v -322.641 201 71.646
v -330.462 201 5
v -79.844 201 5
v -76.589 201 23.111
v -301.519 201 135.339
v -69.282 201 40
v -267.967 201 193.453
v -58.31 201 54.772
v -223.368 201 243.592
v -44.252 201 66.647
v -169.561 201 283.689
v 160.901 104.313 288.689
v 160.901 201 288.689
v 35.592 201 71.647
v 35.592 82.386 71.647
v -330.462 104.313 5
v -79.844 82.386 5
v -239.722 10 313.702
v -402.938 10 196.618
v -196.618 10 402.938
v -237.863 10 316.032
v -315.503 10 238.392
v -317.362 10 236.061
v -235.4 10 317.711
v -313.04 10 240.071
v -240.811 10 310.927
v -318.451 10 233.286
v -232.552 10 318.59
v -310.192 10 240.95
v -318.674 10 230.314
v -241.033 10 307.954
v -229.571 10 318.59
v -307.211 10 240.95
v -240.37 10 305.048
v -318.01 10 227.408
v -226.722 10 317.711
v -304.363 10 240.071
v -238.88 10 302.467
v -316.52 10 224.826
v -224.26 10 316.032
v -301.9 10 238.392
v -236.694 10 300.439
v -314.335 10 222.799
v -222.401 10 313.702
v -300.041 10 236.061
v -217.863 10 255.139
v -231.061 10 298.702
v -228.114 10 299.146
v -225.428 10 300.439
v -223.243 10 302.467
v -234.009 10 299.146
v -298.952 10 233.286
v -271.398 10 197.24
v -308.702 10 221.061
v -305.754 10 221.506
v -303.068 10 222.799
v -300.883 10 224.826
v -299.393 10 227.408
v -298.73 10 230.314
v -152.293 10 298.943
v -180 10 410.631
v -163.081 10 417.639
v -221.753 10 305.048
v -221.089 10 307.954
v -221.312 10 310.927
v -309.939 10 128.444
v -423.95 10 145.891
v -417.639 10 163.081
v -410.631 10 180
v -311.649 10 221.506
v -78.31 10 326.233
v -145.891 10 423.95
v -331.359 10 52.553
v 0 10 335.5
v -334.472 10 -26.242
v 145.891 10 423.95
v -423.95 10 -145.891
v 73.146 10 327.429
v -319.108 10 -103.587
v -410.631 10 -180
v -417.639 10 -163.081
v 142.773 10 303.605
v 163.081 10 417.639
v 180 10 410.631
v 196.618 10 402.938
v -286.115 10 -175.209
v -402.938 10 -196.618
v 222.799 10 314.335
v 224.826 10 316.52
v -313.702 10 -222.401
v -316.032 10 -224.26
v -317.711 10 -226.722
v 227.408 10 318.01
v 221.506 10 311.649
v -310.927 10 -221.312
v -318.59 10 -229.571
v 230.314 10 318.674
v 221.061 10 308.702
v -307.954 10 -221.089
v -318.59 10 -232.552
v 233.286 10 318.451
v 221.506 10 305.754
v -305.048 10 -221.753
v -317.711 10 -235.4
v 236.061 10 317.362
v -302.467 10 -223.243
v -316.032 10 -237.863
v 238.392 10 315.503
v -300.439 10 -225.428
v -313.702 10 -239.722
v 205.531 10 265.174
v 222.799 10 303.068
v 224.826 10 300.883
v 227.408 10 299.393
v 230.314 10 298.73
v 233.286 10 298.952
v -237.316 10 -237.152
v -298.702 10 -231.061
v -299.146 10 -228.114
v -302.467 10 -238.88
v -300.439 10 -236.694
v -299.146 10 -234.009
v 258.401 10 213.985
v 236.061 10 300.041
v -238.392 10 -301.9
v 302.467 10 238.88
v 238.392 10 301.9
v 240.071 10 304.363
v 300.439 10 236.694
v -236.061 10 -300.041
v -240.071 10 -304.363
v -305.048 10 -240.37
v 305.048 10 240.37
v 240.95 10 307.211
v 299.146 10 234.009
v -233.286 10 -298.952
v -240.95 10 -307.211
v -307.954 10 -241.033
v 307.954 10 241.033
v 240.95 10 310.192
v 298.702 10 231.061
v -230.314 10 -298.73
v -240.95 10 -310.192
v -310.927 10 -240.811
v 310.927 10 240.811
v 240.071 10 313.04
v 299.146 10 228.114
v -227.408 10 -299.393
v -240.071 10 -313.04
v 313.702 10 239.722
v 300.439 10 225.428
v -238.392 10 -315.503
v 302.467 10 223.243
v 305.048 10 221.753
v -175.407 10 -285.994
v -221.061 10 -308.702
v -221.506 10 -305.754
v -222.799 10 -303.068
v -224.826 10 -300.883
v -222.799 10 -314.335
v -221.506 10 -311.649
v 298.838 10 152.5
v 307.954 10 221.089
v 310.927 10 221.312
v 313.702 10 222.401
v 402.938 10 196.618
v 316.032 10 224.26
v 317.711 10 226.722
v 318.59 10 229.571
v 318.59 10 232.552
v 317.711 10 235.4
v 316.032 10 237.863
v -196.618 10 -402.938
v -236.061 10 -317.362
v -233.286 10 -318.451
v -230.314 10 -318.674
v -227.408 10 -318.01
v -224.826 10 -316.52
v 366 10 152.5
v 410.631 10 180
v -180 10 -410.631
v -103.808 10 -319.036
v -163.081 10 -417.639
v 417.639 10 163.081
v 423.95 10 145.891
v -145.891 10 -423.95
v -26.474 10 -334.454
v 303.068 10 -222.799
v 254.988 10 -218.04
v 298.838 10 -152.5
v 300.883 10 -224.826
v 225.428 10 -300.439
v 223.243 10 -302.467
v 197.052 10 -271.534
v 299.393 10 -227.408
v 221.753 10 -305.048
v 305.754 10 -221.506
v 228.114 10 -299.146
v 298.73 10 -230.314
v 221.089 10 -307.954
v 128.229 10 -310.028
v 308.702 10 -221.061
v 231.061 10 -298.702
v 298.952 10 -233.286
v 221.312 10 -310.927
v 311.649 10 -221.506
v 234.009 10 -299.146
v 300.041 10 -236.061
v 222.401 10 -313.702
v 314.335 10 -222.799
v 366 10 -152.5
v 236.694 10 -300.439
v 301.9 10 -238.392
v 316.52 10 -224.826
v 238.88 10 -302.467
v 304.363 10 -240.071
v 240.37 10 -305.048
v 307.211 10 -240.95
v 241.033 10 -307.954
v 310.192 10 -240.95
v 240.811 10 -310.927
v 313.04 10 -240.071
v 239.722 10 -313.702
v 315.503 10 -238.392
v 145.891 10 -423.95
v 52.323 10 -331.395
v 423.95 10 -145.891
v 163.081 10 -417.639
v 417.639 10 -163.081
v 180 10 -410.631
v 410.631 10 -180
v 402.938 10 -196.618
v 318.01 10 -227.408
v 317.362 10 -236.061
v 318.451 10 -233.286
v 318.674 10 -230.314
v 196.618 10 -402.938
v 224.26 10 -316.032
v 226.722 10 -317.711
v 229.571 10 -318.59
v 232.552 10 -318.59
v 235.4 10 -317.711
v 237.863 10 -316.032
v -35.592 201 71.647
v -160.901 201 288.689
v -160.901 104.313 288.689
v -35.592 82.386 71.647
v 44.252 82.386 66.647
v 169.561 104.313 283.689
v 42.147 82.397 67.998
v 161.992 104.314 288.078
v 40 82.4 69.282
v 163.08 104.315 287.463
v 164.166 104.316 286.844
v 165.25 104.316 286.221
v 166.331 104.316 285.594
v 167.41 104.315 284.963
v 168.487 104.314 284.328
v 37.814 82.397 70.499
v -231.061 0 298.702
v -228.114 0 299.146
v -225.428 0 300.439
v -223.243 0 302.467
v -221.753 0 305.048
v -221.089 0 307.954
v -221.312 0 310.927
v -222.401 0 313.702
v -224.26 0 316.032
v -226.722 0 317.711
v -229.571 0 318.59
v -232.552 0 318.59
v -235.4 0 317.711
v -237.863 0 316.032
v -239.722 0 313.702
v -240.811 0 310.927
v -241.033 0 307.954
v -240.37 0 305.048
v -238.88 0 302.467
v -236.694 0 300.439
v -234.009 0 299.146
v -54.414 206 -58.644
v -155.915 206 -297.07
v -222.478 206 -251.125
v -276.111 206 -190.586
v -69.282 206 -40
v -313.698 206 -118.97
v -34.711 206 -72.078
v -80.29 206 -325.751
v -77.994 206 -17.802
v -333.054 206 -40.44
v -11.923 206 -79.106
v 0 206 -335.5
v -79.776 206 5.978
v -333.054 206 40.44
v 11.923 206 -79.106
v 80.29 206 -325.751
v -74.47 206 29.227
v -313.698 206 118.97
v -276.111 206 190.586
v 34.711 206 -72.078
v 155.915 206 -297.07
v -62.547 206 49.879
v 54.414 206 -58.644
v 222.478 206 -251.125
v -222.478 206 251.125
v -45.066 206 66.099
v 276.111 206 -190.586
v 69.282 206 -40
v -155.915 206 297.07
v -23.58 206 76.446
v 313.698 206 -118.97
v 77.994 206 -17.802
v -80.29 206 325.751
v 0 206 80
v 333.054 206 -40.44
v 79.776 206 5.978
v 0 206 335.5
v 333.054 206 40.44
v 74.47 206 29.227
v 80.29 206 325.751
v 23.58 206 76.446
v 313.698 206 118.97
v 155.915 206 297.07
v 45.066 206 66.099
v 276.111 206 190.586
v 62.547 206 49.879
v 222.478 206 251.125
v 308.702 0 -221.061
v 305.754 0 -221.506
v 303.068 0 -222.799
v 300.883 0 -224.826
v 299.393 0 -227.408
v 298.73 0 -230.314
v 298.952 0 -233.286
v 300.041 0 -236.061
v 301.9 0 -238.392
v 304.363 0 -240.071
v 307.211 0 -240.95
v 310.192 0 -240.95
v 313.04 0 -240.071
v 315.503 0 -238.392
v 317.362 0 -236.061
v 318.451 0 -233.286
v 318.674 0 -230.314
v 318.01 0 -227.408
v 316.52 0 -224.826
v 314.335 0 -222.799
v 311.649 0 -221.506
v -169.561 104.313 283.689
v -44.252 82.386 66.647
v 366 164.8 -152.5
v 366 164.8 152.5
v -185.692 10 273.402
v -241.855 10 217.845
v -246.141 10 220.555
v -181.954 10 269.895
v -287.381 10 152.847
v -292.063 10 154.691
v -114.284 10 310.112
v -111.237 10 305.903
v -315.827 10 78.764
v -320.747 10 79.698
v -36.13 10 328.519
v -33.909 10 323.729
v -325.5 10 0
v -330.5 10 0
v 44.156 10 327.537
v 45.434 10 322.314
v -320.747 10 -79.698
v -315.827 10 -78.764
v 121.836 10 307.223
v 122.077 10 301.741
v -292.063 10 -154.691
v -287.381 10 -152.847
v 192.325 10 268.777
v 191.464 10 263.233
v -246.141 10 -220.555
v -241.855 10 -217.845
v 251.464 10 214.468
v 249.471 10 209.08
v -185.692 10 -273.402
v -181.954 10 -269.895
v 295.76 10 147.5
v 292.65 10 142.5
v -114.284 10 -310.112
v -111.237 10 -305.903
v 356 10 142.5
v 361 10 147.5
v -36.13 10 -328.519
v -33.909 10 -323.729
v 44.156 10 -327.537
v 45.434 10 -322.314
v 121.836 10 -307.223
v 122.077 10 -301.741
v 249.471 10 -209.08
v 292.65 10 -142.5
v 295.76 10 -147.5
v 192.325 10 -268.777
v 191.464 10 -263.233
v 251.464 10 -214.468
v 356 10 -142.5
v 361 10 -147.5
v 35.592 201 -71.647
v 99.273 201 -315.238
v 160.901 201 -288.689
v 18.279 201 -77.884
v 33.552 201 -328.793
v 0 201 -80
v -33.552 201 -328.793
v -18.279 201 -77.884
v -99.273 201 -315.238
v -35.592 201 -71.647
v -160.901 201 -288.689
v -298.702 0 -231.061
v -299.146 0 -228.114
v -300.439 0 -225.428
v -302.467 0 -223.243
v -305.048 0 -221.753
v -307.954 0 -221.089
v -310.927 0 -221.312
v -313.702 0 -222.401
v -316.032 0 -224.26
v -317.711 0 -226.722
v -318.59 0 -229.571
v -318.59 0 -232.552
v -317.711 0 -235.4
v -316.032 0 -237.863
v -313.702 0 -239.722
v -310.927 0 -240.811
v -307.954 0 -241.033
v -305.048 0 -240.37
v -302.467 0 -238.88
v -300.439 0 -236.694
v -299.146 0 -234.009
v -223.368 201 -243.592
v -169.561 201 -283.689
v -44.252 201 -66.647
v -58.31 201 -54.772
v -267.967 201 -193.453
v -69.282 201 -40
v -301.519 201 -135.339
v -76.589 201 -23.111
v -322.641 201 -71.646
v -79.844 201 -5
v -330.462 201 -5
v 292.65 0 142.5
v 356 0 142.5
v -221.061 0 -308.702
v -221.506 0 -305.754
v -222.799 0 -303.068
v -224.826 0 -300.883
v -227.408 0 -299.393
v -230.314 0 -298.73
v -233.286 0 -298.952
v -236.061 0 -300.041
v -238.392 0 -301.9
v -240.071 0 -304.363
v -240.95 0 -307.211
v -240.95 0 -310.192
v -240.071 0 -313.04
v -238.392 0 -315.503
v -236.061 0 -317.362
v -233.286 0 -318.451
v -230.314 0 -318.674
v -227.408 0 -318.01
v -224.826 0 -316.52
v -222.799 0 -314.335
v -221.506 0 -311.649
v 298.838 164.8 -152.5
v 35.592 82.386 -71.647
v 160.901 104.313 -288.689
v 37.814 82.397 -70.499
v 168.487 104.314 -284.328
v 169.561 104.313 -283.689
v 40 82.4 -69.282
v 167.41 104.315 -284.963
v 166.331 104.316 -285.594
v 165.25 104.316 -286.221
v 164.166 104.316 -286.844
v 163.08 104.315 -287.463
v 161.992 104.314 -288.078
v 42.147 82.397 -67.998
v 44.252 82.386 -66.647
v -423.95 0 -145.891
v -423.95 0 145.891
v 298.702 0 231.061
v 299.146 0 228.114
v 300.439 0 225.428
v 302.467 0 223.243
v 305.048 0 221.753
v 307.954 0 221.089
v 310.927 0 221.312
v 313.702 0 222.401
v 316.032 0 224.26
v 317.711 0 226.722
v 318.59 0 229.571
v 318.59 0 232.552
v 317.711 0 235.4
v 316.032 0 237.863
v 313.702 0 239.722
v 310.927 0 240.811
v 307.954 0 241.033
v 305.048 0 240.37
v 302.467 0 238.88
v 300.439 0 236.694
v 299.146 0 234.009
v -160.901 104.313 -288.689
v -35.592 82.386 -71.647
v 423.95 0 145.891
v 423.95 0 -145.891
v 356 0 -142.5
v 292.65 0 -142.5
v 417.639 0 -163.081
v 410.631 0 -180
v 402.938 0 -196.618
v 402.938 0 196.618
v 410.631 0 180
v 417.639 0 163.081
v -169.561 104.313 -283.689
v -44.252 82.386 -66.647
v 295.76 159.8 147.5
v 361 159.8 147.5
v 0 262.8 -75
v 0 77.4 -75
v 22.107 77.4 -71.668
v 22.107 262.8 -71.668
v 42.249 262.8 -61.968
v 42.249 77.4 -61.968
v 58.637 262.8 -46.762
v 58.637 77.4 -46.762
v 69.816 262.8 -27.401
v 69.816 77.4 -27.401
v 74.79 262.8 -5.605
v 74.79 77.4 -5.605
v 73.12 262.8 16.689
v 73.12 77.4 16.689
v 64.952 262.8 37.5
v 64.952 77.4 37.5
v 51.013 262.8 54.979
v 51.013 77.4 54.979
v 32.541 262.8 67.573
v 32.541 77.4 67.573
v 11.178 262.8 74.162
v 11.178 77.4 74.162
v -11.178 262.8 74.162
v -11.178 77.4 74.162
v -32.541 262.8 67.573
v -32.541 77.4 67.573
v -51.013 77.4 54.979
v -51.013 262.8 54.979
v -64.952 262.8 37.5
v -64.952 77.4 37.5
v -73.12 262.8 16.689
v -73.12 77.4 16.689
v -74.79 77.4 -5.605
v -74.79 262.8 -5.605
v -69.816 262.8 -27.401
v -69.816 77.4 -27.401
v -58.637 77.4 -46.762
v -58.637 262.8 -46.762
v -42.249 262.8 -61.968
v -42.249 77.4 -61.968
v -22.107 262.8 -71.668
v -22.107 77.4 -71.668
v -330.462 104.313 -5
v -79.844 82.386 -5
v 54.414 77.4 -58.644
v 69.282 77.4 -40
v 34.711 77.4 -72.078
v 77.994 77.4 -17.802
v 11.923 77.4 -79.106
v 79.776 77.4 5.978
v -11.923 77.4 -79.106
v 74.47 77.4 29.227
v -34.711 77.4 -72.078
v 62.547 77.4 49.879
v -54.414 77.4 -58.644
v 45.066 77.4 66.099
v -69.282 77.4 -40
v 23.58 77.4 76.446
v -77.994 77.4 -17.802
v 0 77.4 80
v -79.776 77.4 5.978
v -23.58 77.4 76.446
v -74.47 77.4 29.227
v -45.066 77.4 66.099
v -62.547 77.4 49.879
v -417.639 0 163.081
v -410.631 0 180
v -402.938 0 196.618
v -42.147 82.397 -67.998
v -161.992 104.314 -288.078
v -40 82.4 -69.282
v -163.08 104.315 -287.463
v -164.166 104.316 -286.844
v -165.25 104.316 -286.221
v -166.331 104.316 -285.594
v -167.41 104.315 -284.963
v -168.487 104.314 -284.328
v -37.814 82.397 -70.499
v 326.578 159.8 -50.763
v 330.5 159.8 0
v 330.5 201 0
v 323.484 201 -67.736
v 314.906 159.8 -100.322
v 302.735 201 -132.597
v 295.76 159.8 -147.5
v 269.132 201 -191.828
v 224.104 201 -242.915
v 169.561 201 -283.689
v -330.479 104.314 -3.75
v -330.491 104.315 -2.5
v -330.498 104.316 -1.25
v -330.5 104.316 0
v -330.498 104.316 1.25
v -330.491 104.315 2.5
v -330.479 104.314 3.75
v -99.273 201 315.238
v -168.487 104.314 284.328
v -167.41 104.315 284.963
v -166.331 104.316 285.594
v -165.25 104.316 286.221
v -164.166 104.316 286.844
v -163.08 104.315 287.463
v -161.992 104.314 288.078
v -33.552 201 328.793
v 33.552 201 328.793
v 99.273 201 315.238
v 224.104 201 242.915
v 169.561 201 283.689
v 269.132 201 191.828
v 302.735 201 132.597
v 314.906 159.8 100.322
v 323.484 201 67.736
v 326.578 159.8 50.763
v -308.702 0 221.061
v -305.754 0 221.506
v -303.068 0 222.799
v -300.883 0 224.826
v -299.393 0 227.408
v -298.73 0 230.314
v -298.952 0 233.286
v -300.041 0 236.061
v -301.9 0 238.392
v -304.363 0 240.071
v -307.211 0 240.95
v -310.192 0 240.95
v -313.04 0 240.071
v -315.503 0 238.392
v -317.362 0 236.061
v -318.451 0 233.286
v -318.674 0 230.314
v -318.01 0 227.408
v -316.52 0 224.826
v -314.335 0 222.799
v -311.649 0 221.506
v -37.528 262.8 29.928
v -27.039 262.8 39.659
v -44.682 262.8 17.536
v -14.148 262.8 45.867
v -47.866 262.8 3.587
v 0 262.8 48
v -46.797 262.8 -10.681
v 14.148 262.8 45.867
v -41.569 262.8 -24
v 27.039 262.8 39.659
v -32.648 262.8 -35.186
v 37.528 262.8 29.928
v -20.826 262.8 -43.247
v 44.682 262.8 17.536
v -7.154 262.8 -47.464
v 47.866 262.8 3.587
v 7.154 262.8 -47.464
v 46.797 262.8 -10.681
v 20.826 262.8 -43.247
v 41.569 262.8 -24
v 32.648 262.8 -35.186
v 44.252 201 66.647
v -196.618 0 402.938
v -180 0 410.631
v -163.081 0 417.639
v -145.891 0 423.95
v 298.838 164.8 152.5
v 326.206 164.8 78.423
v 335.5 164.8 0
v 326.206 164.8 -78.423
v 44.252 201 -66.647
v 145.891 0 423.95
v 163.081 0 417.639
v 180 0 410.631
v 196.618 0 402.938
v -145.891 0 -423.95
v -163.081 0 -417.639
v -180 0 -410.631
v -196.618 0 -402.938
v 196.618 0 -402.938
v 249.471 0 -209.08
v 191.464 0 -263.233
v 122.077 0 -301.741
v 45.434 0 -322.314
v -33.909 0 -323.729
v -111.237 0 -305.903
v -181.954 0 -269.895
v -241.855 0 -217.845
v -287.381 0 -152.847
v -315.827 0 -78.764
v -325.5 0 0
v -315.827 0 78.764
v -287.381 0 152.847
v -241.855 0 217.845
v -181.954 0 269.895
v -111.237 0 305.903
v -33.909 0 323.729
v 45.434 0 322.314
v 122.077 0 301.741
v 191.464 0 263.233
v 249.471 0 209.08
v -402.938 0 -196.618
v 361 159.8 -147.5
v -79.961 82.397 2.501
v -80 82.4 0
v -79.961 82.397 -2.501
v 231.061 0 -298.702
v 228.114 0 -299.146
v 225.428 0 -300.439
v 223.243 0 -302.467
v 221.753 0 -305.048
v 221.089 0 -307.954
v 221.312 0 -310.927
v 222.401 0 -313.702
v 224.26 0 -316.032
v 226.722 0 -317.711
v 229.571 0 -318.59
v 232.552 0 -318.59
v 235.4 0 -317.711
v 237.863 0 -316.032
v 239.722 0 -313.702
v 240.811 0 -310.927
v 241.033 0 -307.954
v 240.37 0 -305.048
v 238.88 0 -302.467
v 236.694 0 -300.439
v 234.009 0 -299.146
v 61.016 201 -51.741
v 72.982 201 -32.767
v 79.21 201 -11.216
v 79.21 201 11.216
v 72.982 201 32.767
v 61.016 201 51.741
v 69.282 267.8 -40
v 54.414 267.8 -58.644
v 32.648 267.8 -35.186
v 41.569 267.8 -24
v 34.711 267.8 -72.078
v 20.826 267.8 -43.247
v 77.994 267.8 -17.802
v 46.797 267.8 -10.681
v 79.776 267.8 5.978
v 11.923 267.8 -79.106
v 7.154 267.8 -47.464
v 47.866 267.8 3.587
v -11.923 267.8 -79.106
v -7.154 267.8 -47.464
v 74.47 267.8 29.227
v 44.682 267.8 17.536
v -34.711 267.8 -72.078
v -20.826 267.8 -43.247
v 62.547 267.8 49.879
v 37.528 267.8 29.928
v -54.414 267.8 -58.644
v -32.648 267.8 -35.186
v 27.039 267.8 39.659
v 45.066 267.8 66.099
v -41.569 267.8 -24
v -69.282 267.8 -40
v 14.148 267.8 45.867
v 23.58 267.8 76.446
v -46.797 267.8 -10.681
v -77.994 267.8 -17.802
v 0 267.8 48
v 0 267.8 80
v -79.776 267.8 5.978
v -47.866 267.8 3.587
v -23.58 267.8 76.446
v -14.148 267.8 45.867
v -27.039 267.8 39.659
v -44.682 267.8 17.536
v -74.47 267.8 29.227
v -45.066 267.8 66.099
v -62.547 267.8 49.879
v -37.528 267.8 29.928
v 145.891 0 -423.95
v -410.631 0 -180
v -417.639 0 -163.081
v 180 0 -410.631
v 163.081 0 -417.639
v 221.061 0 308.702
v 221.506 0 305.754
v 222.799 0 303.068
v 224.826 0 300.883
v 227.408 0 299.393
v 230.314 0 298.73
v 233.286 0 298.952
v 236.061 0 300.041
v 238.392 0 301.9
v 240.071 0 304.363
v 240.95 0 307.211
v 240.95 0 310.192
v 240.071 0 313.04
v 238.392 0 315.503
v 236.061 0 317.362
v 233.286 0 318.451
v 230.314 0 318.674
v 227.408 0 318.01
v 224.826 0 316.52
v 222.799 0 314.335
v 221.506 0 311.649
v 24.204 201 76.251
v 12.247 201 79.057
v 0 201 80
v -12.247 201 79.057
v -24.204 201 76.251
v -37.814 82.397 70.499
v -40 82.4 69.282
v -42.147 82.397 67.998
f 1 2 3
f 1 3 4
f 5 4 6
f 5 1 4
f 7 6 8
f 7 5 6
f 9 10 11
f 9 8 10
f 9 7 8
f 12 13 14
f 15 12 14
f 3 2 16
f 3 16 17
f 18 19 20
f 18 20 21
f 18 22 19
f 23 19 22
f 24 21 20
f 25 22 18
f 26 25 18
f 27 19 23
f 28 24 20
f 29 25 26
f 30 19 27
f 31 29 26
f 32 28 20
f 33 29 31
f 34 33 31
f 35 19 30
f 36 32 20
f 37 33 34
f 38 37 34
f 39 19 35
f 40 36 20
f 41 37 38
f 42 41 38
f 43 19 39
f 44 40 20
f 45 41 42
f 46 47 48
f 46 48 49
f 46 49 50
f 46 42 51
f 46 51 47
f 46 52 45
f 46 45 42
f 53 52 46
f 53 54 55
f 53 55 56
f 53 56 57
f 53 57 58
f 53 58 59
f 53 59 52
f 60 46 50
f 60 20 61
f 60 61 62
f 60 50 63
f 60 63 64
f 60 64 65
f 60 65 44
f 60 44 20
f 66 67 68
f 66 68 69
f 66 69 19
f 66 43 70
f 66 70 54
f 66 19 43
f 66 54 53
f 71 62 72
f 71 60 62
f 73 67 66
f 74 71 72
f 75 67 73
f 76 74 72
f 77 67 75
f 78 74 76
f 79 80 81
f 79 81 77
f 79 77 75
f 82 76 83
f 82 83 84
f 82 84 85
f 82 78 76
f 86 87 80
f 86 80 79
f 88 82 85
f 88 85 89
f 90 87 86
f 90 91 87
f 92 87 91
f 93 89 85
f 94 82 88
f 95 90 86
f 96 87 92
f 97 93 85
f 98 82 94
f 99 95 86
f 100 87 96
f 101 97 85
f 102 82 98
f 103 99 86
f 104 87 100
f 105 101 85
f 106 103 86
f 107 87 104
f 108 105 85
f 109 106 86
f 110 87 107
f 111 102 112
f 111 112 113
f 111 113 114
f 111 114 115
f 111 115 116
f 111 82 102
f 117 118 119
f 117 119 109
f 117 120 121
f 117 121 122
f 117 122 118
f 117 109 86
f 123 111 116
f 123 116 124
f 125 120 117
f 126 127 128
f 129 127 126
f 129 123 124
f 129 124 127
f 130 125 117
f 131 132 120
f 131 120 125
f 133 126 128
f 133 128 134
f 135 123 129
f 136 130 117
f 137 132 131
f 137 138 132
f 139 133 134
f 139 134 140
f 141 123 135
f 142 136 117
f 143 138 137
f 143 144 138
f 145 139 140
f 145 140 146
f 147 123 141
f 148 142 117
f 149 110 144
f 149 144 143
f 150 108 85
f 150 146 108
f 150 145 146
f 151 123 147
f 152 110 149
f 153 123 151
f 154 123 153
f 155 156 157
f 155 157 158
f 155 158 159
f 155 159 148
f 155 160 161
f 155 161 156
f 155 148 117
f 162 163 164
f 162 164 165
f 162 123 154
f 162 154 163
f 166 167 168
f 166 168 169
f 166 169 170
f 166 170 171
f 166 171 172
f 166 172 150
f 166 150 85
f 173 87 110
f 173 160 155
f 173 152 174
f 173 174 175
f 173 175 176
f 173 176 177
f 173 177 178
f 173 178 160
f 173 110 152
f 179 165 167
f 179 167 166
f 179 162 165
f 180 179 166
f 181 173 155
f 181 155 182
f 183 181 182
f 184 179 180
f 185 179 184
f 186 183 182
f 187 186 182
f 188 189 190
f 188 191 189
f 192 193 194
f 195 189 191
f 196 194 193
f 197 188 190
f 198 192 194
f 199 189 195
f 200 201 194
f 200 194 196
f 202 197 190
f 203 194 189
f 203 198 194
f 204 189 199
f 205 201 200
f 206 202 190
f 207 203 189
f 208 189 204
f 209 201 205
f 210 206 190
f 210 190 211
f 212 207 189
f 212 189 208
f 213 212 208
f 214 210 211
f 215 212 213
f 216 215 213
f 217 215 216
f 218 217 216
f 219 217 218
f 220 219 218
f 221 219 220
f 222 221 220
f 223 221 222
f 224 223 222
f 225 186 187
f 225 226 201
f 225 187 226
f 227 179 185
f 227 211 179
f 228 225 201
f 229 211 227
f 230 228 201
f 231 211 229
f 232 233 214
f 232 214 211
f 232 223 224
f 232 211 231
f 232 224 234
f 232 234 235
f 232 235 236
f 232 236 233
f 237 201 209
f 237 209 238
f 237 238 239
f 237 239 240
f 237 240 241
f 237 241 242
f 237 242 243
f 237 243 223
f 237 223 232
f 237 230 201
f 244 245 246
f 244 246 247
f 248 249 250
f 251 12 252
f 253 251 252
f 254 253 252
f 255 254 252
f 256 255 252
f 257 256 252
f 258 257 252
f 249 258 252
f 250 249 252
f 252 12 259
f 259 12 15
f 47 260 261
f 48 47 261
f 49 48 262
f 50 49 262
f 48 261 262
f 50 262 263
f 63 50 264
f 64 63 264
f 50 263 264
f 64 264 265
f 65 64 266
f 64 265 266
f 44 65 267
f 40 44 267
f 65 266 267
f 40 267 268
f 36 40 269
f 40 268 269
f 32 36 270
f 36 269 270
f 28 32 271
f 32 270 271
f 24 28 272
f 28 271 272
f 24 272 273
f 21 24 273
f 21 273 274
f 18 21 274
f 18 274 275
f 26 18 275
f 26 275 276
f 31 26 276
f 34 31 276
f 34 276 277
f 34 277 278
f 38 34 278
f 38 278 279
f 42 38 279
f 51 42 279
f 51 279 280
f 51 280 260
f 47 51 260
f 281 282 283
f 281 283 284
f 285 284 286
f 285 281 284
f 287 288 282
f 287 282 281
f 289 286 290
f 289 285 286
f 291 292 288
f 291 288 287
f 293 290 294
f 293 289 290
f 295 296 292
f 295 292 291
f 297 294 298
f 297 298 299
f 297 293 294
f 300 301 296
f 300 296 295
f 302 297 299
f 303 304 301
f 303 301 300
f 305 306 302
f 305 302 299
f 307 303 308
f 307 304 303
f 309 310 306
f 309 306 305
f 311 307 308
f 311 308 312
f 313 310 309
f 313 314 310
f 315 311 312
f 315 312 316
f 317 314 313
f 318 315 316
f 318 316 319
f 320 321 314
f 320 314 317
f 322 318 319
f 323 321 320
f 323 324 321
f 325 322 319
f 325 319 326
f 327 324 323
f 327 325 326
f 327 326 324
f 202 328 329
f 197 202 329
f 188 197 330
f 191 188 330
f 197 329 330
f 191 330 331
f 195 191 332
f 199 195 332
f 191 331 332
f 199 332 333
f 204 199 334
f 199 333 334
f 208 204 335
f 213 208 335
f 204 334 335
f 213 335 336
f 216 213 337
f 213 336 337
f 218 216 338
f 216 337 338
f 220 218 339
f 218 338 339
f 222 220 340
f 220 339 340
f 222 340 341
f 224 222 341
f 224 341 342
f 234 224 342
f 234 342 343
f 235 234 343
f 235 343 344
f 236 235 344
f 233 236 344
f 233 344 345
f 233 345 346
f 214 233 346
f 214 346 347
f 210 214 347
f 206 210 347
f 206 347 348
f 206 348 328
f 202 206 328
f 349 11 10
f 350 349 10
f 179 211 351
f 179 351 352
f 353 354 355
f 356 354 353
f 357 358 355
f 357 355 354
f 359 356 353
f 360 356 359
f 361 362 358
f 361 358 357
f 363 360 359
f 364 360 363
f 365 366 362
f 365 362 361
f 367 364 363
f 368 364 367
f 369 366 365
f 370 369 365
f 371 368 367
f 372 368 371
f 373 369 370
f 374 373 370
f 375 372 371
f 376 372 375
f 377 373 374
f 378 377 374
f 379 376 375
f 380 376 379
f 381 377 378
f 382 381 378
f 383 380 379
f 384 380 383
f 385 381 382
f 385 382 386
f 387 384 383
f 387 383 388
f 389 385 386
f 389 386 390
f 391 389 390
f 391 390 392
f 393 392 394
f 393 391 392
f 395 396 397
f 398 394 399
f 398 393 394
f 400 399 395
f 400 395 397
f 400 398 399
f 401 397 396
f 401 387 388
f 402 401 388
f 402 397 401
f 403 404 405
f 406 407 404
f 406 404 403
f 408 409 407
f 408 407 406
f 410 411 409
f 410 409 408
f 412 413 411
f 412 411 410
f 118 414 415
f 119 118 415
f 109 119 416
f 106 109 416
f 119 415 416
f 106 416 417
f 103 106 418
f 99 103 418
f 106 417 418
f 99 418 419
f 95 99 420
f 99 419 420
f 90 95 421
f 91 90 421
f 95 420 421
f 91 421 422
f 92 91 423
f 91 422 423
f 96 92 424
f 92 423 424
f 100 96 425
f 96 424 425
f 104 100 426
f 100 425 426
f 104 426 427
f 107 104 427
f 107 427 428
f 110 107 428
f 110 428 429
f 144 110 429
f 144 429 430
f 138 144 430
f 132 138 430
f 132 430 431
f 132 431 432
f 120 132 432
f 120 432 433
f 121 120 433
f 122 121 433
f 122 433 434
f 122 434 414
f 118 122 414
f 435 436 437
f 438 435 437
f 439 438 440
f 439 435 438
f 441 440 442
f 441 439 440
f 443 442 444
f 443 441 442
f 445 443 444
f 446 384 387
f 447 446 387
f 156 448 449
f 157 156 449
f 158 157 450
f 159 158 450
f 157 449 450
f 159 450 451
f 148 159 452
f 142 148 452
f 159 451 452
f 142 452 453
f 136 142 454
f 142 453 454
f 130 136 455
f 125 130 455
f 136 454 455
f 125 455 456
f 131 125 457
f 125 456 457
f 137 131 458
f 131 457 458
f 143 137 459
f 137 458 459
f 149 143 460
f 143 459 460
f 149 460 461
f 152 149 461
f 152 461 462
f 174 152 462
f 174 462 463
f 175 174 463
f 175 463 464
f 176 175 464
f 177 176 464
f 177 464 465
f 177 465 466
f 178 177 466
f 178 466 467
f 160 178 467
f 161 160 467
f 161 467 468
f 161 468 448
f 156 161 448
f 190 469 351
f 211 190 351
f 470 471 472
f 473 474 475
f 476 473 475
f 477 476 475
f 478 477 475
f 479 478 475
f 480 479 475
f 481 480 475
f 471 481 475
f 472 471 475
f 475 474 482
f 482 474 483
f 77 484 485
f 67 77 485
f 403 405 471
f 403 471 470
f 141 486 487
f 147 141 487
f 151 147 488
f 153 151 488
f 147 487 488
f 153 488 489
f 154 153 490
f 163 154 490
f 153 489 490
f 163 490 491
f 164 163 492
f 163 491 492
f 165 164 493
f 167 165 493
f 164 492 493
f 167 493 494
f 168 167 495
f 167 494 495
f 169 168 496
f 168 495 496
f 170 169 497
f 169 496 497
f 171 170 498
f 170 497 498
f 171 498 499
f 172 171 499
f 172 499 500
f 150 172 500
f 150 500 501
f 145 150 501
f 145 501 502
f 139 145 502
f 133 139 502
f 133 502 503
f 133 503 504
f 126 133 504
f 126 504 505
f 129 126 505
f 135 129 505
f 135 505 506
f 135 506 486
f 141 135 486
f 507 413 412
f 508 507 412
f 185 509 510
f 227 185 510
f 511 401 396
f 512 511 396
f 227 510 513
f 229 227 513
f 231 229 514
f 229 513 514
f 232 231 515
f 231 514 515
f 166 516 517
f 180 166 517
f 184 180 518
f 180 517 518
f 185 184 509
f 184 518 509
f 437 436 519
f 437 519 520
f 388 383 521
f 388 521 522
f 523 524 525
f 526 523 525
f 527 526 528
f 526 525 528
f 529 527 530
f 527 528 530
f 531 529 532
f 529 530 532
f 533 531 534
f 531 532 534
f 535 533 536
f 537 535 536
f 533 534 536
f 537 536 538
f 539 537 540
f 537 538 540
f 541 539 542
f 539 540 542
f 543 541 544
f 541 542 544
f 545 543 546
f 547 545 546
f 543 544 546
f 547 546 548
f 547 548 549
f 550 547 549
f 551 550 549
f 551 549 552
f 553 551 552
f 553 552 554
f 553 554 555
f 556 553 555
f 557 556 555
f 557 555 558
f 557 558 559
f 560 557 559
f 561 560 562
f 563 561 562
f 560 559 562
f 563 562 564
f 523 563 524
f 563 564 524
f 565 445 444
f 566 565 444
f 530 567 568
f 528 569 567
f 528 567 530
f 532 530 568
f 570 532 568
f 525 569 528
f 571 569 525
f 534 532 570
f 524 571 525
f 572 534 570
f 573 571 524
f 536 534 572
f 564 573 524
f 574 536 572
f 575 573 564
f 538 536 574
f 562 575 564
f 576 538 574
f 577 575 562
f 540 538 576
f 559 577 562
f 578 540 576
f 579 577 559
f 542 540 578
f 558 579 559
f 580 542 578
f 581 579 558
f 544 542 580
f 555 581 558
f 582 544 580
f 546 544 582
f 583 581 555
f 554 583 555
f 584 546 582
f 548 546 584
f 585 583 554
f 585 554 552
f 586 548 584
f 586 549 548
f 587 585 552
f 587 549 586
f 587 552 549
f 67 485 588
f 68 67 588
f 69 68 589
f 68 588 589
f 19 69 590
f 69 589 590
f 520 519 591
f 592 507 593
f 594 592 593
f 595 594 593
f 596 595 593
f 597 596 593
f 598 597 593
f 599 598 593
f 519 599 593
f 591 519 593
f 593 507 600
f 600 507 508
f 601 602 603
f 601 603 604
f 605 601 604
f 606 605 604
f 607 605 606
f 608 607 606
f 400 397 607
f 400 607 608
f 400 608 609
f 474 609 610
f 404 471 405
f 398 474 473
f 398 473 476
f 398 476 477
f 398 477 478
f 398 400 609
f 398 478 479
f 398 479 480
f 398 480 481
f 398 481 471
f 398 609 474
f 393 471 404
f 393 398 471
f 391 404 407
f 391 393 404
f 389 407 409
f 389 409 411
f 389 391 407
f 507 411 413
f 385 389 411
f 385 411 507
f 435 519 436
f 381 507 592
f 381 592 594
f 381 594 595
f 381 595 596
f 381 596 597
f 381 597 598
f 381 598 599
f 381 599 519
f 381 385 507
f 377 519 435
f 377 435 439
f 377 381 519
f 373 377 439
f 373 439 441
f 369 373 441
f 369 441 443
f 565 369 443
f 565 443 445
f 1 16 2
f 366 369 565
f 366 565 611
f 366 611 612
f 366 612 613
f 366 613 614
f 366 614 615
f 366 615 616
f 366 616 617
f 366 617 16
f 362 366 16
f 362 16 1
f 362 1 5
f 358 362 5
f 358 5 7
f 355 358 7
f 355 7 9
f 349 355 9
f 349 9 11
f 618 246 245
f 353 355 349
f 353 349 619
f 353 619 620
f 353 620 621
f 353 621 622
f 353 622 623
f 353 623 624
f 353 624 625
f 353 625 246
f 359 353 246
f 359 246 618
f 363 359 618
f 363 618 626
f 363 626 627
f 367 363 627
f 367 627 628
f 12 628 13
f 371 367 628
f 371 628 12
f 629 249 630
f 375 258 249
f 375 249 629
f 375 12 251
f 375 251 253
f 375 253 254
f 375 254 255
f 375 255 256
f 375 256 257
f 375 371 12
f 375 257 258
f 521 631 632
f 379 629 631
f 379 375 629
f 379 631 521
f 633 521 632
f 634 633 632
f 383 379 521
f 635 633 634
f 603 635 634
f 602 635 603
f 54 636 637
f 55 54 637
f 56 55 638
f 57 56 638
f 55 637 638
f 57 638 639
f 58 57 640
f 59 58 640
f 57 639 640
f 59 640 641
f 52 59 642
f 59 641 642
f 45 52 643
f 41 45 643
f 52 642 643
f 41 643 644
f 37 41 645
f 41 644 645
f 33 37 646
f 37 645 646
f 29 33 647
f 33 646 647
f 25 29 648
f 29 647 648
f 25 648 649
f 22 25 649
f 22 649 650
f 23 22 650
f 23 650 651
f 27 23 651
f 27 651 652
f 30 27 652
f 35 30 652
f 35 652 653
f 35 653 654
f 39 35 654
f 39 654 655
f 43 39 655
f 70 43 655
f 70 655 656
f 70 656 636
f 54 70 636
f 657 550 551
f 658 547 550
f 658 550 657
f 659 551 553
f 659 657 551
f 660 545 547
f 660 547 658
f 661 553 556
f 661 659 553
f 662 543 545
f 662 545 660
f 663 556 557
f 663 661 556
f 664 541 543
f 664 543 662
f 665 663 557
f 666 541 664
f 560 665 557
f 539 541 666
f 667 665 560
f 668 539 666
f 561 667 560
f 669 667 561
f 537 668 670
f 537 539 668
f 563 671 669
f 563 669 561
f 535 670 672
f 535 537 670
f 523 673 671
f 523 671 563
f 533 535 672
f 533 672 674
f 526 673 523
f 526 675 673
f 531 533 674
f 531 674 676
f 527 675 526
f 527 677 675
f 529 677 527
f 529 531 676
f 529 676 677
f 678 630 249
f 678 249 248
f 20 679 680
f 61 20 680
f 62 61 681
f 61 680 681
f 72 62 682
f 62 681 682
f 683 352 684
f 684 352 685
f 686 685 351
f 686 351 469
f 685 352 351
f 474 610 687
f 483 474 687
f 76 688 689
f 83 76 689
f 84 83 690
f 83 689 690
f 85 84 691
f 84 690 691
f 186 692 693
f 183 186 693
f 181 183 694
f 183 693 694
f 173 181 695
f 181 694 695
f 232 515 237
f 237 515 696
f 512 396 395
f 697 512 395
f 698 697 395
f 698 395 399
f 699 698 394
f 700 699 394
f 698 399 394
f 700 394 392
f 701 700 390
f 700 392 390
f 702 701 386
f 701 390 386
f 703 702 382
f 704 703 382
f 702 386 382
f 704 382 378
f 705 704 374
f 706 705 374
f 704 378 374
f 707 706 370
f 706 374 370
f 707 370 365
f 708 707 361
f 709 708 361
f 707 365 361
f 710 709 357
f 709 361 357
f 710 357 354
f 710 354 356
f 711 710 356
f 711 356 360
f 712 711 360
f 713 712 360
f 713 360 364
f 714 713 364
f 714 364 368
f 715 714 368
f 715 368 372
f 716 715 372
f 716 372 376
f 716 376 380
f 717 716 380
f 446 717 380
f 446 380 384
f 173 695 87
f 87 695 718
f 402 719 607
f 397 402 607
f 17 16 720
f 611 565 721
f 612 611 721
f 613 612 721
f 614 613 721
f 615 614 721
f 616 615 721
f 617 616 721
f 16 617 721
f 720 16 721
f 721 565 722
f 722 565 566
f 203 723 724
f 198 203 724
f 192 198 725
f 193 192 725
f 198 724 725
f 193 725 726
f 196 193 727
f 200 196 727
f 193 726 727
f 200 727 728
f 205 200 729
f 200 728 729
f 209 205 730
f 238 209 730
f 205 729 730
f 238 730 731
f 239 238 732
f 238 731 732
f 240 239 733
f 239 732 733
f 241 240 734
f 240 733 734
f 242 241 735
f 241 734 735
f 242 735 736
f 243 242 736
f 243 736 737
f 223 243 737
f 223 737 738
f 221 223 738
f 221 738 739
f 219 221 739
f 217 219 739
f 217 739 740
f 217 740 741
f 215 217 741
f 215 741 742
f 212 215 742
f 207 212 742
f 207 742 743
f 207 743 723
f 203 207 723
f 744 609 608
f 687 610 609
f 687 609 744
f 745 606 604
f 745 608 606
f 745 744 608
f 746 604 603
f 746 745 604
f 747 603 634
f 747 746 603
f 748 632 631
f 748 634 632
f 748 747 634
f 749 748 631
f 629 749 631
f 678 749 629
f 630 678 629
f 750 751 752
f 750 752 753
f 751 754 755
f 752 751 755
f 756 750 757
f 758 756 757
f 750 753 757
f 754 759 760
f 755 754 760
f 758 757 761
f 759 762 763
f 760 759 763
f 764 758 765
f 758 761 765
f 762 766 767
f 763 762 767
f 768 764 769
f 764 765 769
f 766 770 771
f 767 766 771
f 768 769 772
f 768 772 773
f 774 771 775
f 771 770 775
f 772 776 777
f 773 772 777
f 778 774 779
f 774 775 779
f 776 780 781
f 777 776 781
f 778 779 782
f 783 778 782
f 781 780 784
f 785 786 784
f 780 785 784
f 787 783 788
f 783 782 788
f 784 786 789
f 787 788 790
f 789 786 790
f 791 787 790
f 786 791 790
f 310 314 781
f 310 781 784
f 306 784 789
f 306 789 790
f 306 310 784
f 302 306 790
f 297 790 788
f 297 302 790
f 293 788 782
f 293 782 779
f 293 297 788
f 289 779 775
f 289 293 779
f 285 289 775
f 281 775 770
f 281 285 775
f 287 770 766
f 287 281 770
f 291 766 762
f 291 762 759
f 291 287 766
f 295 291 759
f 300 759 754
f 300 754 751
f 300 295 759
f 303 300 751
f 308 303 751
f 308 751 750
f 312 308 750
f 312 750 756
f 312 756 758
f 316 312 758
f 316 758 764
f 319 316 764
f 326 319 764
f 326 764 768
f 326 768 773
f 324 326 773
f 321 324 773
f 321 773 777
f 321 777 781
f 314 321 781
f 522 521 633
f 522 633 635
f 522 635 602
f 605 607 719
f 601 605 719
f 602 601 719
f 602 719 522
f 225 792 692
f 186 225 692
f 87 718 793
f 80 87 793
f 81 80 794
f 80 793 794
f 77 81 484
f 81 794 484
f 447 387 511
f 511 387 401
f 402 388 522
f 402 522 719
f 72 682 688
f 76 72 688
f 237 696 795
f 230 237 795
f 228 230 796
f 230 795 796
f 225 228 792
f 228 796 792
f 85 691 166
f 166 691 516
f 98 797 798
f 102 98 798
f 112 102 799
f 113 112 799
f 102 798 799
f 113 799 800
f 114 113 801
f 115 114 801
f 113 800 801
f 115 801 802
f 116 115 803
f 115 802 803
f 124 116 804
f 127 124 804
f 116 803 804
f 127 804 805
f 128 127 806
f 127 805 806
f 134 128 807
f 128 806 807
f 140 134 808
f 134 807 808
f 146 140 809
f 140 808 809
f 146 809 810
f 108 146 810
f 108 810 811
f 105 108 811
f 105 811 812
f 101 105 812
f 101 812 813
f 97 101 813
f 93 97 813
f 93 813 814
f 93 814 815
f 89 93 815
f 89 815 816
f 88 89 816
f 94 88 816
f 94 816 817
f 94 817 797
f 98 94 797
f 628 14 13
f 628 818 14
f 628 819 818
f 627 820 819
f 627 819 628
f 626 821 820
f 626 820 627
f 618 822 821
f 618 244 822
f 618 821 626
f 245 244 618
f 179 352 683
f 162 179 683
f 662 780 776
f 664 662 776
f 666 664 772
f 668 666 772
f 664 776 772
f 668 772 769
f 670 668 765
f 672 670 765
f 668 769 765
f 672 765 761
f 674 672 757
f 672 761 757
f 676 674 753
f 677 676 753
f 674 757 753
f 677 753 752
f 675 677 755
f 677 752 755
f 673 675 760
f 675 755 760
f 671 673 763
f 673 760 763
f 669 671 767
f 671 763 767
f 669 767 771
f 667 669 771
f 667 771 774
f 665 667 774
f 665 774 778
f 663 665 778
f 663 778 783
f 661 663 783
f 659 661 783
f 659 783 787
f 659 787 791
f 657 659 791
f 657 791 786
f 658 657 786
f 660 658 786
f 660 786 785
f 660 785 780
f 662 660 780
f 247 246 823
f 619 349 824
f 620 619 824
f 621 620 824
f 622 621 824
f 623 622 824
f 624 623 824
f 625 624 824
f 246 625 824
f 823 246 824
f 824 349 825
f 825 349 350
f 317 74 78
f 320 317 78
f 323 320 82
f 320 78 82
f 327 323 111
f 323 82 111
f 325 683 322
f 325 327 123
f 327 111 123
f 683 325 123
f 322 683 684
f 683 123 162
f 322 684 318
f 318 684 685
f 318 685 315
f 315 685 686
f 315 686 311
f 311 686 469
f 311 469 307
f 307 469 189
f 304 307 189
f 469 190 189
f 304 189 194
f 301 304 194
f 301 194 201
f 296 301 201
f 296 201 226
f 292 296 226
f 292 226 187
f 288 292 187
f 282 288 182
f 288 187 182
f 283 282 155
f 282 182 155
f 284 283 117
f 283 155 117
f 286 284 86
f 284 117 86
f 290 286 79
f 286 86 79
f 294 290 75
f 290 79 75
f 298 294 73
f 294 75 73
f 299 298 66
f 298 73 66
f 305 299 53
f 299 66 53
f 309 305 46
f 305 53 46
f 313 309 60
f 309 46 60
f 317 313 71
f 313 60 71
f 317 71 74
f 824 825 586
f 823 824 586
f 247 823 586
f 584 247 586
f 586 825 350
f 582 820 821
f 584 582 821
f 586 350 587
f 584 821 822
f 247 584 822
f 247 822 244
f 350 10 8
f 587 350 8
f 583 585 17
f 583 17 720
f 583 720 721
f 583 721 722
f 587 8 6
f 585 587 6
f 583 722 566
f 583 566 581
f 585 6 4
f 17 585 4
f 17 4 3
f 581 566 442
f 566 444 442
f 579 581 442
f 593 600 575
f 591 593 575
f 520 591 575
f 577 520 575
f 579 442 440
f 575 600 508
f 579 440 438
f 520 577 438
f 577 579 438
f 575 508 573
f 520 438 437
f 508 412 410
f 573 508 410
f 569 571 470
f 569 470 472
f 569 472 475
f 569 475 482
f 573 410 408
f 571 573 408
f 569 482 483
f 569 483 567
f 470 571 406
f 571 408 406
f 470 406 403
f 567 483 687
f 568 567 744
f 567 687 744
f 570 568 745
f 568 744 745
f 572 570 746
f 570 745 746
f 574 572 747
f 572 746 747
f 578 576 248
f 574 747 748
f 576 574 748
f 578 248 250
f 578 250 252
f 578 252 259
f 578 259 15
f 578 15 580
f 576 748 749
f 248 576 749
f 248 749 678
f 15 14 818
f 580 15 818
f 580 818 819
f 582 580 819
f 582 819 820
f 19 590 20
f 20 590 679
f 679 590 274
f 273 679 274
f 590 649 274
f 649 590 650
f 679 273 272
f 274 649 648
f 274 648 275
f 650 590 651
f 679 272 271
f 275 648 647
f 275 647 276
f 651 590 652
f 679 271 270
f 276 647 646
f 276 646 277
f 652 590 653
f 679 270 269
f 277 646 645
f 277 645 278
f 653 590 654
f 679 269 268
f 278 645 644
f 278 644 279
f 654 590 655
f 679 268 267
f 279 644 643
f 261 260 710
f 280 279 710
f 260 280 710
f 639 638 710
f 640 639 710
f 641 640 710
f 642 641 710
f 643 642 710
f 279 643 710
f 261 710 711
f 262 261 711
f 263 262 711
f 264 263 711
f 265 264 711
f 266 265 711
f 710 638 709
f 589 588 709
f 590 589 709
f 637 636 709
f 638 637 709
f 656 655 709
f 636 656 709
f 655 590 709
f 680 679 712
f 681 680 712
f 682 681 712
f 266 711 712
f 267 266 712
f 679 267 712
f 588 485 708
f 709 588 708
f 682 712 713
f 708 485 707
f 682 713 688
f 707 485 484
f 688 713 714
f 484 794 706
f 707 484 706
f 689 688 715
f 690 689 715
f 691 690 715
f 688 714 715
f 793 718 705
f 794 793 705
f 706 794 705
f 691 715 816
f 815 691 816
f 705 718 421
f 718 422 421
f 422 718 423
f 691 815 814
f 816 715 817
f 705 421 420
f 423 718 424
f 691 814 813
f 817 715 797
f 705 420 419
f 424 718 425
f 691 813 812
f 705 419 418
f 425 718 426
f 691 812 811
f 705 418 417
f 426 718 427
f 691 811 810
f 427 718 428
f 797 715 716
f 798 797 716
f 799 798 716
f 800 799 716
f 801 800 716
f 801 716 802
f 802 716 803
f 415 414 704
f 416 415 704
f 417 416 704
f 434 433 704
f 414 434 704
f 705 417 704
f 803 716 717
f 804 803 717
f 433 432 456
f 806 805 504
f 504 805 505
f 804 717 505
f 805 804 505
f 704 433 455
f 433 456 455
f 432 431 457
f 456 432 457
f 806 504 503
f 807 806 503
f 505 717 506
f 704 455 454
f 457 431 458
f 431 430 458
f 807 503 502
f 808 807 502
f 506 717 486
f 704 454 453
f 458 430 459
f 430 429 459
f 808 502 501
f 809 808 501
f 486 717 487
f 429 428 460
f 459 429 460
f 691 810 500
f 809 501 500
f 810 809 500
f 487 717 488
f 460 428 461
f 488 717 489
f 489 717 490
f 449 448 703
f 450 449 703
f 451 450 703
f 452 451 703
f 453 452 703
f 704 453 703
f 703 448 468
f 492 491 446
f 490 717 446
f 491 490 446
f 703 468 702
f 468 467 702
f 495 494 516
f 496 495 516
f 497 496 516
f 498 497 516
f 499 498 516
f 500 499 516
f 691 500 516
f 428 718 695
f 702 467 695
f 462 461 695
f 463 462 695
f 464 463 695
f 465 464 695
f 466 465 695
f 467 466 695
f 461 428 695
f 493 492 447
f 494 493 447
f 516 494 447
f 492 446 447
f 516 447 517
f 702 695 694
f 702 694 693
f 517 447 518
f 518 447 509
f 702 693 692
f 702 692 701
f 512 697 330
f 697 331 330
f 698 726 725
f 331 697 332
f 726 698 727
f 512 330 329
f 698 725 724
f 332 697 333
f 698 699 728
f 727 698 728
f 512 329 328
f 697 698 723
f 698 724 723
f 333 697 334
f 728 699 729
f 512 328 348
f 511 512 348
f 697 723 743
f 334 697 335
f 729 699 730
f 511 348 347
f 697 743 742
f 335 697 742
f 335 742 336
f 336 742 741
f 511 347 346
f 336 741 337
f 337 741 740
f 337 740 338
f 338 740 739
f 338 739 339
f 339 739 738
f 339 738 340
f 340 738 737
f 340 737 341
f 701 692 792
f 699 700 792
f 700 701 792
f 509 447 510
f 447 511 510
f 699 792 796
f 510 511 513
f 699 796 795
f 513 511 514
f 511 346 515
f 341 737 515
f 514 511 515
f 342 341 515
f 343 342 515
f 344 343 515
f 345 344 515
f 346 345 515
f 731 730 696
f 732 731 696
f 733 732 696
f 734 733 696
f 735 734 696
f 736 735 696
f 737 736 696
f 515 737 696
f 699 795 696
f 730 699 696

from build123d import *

# Parameters (mm, degrees)
EXTRUDE_1_DEPTH          = 10
SKETCH_2_R               = 335.5
EXTRUDE_2_DEPTH          = 196
EXTRUDE_4_DEPTH          = 154.8
SHELL_START              = 10
SHELL_4_OUTLINE_R        = 330.5
SHELL_4_DEPTH            = 191
SHELL_4_2_DEPTH          = 149.8
CUT_EXTRUDE_2_DEPTH      = 196
SKETCH_6_R               = 80
EXTRUDE_6_DEPTH          = 66.8
SKETCH_6_2_R             = 80
EXTRUDE_7_DEPTH          = 123.6
SKETCH_7_R               = 75
CUT_EXTRUDE_3_DEPTH      = 185.4
SKETCH_9_R               = 10
CUT_EXTRUDE_11_DEPTH     = 25
PATTERN_CIRCULAR_1_COUNT = 4
RIB_START                = -5
RIB_1_DEPTH              = 10
PATTERN_CIRCULAR_3_COUNT = 6
SKETCH_13_R              = 48
CUT_EXTRUDE_12_DEPTH     = 657.646057629


# Read off the part's stored shape, not the designer's step: 抽壳4, 筋1
with BuildPart() as part:
    # 草图1 → 凸台-拉伸1 (new body)
    with BuildSketch(Plane(origin=(0, 0, 0), x_dir=(1, 0, 0), z_dir=(0, 1, 0))):
        with BuildLine():
            ThreePointArc((-145.890781066, 423.95), (-171.576116901, 414.221388401), (-196.61755928, 402.938280488))
            Line((-196.61755928, 402.938280488), (-402.938280488, 196.61755928))
            ThreePointArc((-402.938280488, 196.61755928), (-414.221388401, 171.576116901), (-423.95, 145.890781066))
            Line((-423.95, 145.890781066), (-423.95, -145.890781066))
            ThreePointArc((-423.95, -145.890781066), (-414.221388401, -171.576116901), (-402.938280488, -196.61755928))
            Line((-402.938280488, -196.61755928), (-196.61755928, -402.938280488))
            ThreePointArc((-196.61755928, -402.938280488), (-171.576116901, -414.221388401), (-145.890781066, -423.95))
            Line((-145.890781066, -423.95), (145.890781066, -423.95))
            ThreePointArc((145.890781066, -423.95), (171.576116901, -414.221388401), (196.61755928, -402.938280488))
            Line((196.61755928, -402.938280488), (402.938280488, -196.61755928))
            ThreePointArc((402.938280488, -196.61755928), (414.221388401, -171.576116901), (423.95, -145.890781066))
            Line((423.95, -145.890781066), (423.95, 145.890781066))
            ThreePointArc((423.95, 145.890781066), (414.221388401, 171.576116901), (402.938280488, 196.61755928))
            Line((402.938280488, 196.61755928), (196.61755928, 402.938280488))
            ThreePointArc((196.61755928, 402.938280488), (171.576116901, 414.221388401), (145.890781066, 423.95))
            Line((145.890781066, 423.95), (-145.890781066, 423.95))
        make_face()
    extrude(amount=EXTRUDE_1_DEPTH)

    # 草图5 → 切除-拉伸2 (cut)
    with BuildSketch(Plane.XZ.offset(-10)):
        with BuildLine():
            Line((356, -142.5), (292.649961558, -142.5))
            ThreePointArc((292.649961558, -142.5), (-325.5, 0), (292.649961558, 142.5))
            Line((292.649961558, 142.5), (356, 142.5))
            Line((356, 142.5), (356, -142.5))
        make_face()
    extrude(amount=CUT_EXTRUDE_2_DEPTH, mode=Mode.SUBTRACT)


with BuildPart() as body_2:
    # 草图2 → 凸台-拉伸2 (new body)
    with BuildSketch(Plane(origin=(0, 10, 0), x_dir=(1, 0, 0), z_dir=(0, 1, 0))):
        with Locations(Location((0, 0, 0), (0, 0, 270))):
            Circle(SKETCH_2_R)
    extrude(amount=EXTRUDE_2_DEPTH)


with BuildPart() as body_3:
    # 草图3 → 凸台-拉伸4 (new body)
    with BuildSketch(Plane(origin=(0, 10, 0), x_dir=(1, 0, 0), z_dir=(0, 1, 0))):
        with BuildLine():
            Line((366, 152.5), (366, -152.5))
            Line((366, -152.5), (298.83774862, -152.5))
            ThreePointArc((298.83774862, -152.5), (335.5, 0), (298.83774862, 152.5))
            Line((298.83774862, 152.5), (366, 152.5))
        make_face()
    extrude(amount=EXTRUDE_4_DEPTH)


with BuildPart() as body_2_1:
    add(body_2.part)

    # Combine 1: union body 3
    add(body_3.part)

    # 抽壳4 outline → 抽壳4 (cut)
    with BuildSketch(Plane(origin=(0, 0, 0), x_dir=(1, 0, 0), z_dir=(0, 1, 0)).offset(SHELL_START)):
        Circle(SHELL_4_OUTLINE_R)
    extrude(amount=SHELL_4_DEPTH, mode=Mode.SUBTRACT)

    # Shell 4 2 outline → Shell 4 2 (cut)
    with BuildSketch(Plane(origin=(0, 0, 0), x_dir=(1, 0, 0), z_dir=(0, 1, 0)).offset(SHELL_START)):
        with BuildLine():
            ThreePointArc((295.760037869, 147.5), (330.5, 0), (295.760037869, -147.5))
            Line((295.760037869, -147.5), (361, -147.5))
            Line((361, -147.5), (361, 147.5))
            Line((361, 147.5), (295.760037869, 147.5))
        make_face()
    extrude(amount=SHELL_4_2_DEPTH, mode=Mode.SUBTRACT)

    # Combine 2: union part
    add(part.part)

    # 草图6 → 凸台-拉伸6 (add)
    with BuildSketch(Plane.XZ.offset(-201)):
        with Locations(Location((0, 0, 0), (0, 0, 90))):
            Circle(SKETCH_6_R)
    extrude(amount=-EXTRUDE_6_DEPTH)

    # 草图6<2> → 凸台-拉伸7 (add)
    with BuildSketch(Plane.XZ.offset(-201)):
        with Locations(Location((0, 0, 0), (0, 0, 90))):
            Circle(SKETCH_6_2_R)
    extrude(amount=EXTRUDE_7_DEPTH)

    # 草图7 → 切除-拉伸3 (cut)
    with BuildSketch(Plane.XZ.offset(-77.4)):
        with Locations(Location((0, 0, 0), (0, 0, 270))):
            Circle(SKETCH_7_R)
    extrude(amount=-CUT_EXTRUDE_3_DEPTH, mode=Mode.SUBTRACT)

    # 草图9 → 切除-拉伸11 (cut)
    with BuildSketch(Plane.XZ):
        with Locations(Location((-308.701607463, 231.061282888, 0), (0, 0, 270))):
            Circle(SKETCH_9_R)
        with Locations(Location((-231.061282888, 308.701607463, 0), (0, 0, 270))):
            Circle(SKETCH_9_R)
    cut_extrude_11 = extrude(amount=-CUT_EXTRUDE_11_DEPTH, mode=Mode.SUBTRACT)

    # 阵列(圆周)1: 切除-拉伸11 ×4 about axis
    pattern_circular_1_axis = Axis((0, 0, 0), (0, 1, 0))
    for i in range(1, PATTERN_CIRCULAR_1_COUNT):
        add(cut_extrude_11.rotate(pattern_circular_1_axis, i * 360 / PATTERN_CIRCULAR_1_COUNT), mode=Mode.SUBTRACT)

    # 筋1 outline → 筋1 (add)
    with BuildSketch(Plane.XY.offset(RIB_START)):
        Polygon((-330.5, 104.315910213), (-79.843597113, 82.38631652), (-78, 82.225022673), (-78, 201), (-332, 201), (-332, 104.447143208), align=None)
    rib_1 = extrude(amount=RIB_1_DEPTH)

    # 阵列(圆周)3: 筋1 ×6 about axis, 1 skipped
    pattern_circular_3_axis = Axis((0, 0, 0), (0, 1, 0))
    add([rib_1.rotate(pattern_circular_3_axis, i * 360 / PATTERN_CIRCULAR_3_COUNT) for i in range(1, PATTERN_CIRCULAR_3_COUNT) if i not in (3,)])

    # 草图13 → 切除-拉伸12 (cut, through all)
    with BuildSketch(Plane(origin=(0, 267.8, 0), x_dir=(1, 0, 0), z_dir=(0, 1, 0))):
        with Locations(Location((0, 0, 0), (0, 0, 270))):
            Circle(SKETCH_13_R)
    extrude(amount=-CUT_EXTRUDE_12_DEPTH, mode=Mode.SUBTRACT)


solid = body_2_1.part
